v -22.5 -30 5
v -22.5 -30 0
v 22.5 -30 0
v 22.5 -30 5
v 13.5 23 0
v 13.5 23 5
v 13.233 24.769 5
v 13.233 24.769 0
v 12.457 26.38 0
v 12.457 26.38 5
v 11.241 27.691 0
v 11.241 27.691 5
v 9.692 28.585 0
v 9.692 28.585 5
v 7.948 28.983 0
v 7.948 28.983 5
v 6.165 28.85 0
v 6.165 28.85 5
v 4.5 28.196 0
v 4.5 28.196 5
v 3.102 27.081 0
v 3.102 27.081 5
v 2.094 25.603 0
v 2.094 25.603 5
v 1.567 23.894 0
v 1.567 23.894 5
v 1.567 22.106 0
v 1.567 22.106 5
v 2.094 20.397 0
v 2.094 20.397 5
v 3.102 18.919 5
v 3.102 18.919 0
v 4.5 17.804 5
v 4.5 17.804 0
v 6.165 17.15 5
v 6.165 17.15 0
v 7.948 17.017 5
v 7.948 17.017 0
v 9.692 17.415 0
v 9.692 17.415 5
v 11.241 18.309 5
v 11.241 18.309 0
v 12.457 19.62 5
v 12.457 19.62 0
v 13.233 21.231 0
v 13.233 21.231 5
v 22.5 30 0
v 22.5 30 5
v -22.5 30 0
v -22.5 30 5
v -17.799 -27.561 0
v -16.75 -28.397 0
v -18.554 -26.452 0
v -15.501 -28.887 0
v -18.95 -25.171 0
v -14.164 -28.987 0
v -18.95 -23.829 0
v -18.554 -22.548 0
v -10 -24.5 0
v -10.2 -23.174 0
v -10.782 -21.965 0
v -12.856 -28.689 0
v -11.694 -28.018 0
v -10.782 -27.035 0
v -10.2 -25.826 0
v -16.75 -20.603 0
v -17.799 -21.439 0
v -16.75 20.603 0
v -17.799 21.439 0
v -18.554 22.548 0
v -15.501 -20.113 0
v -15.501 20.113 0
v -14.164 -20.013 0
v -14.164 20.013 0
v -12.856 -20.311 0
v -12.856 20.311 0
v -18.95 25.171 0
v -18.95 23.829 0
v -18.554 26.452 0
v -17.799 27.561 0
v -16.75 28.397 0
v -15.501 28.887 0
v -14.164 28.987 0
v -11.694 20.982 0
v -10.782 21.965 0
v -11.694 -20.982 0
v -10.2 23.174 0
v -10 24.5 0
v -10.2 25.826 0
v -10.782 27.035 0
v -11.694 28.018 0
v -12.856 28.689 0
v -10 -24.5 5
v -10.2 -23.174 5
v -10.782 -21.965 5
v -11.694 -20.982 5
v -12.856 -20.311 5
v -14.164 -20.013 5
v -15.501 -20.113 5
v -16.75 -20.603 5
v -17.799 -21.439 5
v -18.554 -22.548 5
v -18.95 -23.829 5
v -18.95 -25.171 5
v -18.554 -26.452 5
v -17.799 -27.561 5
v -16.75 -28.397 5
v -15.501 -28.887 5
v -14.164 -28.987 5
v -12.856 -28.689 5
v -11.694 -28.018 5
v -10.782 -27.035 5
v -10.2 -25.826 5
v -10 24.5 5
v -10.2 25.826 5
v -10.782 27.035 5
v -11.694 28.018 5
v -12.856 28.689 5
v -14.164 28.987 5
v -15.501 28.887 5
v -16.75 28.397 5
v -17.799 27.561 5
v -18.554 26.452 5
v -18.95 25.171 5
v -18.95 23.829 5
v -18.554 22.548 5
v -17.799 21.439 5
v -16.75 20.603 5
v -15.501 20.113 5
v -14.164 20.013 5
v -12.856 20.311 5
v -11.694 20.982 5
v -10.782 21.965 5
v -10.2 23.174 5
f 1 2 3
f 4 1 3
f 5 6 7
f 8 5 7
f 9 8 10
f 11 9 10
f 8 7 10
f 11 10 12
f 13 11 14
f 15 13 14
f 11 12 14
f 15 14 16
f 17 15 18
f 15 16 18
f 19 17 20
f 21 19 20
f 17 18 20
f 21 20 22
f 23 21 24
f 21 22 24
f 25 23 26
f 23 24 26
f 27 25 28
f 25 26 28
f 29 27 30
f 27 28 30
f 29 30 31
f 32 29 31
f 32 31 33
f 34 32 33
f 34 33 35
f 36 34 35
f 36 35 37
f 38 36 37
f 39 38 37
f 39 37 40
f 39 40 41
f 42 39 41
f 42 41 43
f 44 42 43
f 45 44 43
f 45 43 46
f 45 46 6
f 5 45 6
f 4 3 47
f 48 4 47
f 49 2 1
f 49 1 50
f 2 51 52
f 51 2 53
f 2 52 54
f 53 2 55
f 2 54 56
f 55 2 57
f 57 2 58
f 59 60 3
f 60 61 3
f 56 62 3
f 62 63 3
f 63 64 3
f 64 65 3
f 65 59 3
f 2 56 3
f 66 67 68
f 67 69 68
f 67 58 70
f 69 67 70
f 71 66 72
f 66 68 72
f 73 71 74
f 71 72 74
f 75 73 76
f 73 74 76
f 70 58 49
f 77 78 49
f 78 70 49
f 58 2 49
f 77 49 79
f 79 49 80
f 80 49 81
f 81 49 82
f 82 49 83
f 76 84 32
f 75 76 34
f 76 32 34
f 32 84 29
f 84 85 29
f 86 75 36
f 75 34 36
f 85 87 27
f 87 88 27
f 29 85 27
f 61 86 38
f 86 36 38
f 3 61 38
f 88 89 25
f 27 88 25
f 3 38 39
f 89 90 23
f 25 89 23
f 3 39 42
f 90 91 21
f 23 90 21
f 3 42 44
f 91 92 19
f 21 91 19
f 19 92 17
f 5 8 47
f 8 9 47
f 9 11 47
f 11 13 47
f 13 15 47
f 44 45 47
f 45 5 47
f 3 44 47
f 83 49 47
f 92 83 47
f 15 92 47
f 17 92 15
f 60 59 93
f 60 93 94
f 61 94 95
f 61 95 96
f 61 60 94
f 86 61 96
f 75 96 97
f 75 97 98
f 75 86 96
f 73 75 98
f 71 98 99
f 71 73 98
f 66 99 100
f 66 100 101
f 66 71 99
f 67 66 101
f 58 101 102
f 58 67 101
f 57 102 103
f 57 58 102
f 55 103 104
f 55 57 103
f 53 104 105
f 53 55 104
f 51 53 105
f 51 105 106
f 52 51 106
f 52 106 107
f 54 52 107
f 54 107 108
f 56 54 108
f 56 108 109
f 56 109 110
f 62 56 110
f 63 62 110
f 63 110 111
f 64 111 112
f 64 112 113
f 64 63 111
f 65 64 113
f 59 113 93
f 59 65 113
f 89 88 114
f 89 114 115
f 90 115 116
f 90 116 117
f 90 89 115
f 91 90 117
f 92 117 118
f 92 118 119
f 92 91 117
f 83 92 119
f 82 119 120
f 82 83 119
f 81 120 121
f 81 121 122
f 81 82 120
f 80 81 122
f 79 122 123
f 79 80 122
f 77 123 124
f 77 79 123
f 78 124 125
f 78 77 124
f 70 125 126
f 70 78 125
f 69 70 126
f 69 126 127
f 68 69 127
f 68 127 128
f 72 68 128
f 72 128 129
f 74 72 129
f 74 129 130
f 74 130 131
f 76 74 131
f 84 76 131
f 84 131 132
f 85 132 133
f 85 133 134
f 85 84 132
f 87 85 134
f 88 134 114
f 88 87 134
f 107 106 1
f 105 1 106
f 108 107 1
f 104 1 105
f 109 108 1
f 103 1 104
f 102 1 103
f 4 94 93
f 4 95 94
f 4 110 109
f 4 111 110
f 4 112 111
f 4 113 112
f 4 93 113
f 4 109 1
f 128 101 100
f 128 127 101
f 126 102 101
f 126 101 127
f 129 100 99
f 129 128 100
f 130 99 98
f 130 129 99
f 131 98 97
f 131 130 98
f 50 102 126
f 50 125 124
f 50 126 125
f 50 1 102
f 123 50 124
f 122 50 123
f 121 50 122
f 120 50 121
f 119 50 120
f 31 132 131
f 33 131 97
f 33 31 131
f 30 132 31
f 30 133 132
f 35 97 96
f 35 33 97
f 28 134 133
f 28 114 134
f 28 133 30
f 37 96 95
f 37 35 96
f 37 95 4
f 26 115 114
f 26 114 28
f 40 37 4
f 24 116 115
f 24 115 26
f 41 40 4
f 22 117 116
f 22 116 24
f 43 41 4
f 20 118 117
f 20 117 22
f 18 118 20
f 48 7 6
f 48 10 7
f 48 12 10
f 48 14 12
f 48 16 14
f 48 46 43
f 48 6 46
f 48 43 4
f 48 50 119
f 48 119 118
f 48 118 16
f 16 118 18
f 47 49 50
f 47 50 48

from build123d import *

# Parameters (mm, degrees)
SZKIC1_W                    = 45
SZKIC1_H                    = 60
SZKIC1_R                    = 4.5
DODANIE_WYCI_GNI_CIE1_DEPTH = 5
SZKIC2_R                    = 6
WYTNIJ_WYCI_GNI_CIE1_DEPTH  = 10


with BuildPart() as part:
    # Szkic1 → Dodanie-wyciągnięcie1 (new body)
    with BuildSketch(Plane.XY):
        Rectangle(SZKIC1_W, SZKIC1_H)
        with Locations((-14.5, 24.5)):
            Circle(SZKIC1_R, mode=Mode.SUBTRACT)
        with Locations((-14.5, -24.5)):
            Circle(SZKIC1_R, mode=Mode.SUBTRACT)
    extrude(amount=DODANIE_WYCI_GNI_CIE1_DEPTH)

    # Szkic2 → Wytnij-wyciągnięcie1 (cut)
    with BuildSketch(Plane.XY.offset(5)):
        with Locations((7.5, 23)):
            Circle(SZKIC2_R)
    extrude(amount=-WYTNIJ_WYCI_GNI_CIE1_DEPTH, mode=Mode.SUBTRACT)


solid = part.part
